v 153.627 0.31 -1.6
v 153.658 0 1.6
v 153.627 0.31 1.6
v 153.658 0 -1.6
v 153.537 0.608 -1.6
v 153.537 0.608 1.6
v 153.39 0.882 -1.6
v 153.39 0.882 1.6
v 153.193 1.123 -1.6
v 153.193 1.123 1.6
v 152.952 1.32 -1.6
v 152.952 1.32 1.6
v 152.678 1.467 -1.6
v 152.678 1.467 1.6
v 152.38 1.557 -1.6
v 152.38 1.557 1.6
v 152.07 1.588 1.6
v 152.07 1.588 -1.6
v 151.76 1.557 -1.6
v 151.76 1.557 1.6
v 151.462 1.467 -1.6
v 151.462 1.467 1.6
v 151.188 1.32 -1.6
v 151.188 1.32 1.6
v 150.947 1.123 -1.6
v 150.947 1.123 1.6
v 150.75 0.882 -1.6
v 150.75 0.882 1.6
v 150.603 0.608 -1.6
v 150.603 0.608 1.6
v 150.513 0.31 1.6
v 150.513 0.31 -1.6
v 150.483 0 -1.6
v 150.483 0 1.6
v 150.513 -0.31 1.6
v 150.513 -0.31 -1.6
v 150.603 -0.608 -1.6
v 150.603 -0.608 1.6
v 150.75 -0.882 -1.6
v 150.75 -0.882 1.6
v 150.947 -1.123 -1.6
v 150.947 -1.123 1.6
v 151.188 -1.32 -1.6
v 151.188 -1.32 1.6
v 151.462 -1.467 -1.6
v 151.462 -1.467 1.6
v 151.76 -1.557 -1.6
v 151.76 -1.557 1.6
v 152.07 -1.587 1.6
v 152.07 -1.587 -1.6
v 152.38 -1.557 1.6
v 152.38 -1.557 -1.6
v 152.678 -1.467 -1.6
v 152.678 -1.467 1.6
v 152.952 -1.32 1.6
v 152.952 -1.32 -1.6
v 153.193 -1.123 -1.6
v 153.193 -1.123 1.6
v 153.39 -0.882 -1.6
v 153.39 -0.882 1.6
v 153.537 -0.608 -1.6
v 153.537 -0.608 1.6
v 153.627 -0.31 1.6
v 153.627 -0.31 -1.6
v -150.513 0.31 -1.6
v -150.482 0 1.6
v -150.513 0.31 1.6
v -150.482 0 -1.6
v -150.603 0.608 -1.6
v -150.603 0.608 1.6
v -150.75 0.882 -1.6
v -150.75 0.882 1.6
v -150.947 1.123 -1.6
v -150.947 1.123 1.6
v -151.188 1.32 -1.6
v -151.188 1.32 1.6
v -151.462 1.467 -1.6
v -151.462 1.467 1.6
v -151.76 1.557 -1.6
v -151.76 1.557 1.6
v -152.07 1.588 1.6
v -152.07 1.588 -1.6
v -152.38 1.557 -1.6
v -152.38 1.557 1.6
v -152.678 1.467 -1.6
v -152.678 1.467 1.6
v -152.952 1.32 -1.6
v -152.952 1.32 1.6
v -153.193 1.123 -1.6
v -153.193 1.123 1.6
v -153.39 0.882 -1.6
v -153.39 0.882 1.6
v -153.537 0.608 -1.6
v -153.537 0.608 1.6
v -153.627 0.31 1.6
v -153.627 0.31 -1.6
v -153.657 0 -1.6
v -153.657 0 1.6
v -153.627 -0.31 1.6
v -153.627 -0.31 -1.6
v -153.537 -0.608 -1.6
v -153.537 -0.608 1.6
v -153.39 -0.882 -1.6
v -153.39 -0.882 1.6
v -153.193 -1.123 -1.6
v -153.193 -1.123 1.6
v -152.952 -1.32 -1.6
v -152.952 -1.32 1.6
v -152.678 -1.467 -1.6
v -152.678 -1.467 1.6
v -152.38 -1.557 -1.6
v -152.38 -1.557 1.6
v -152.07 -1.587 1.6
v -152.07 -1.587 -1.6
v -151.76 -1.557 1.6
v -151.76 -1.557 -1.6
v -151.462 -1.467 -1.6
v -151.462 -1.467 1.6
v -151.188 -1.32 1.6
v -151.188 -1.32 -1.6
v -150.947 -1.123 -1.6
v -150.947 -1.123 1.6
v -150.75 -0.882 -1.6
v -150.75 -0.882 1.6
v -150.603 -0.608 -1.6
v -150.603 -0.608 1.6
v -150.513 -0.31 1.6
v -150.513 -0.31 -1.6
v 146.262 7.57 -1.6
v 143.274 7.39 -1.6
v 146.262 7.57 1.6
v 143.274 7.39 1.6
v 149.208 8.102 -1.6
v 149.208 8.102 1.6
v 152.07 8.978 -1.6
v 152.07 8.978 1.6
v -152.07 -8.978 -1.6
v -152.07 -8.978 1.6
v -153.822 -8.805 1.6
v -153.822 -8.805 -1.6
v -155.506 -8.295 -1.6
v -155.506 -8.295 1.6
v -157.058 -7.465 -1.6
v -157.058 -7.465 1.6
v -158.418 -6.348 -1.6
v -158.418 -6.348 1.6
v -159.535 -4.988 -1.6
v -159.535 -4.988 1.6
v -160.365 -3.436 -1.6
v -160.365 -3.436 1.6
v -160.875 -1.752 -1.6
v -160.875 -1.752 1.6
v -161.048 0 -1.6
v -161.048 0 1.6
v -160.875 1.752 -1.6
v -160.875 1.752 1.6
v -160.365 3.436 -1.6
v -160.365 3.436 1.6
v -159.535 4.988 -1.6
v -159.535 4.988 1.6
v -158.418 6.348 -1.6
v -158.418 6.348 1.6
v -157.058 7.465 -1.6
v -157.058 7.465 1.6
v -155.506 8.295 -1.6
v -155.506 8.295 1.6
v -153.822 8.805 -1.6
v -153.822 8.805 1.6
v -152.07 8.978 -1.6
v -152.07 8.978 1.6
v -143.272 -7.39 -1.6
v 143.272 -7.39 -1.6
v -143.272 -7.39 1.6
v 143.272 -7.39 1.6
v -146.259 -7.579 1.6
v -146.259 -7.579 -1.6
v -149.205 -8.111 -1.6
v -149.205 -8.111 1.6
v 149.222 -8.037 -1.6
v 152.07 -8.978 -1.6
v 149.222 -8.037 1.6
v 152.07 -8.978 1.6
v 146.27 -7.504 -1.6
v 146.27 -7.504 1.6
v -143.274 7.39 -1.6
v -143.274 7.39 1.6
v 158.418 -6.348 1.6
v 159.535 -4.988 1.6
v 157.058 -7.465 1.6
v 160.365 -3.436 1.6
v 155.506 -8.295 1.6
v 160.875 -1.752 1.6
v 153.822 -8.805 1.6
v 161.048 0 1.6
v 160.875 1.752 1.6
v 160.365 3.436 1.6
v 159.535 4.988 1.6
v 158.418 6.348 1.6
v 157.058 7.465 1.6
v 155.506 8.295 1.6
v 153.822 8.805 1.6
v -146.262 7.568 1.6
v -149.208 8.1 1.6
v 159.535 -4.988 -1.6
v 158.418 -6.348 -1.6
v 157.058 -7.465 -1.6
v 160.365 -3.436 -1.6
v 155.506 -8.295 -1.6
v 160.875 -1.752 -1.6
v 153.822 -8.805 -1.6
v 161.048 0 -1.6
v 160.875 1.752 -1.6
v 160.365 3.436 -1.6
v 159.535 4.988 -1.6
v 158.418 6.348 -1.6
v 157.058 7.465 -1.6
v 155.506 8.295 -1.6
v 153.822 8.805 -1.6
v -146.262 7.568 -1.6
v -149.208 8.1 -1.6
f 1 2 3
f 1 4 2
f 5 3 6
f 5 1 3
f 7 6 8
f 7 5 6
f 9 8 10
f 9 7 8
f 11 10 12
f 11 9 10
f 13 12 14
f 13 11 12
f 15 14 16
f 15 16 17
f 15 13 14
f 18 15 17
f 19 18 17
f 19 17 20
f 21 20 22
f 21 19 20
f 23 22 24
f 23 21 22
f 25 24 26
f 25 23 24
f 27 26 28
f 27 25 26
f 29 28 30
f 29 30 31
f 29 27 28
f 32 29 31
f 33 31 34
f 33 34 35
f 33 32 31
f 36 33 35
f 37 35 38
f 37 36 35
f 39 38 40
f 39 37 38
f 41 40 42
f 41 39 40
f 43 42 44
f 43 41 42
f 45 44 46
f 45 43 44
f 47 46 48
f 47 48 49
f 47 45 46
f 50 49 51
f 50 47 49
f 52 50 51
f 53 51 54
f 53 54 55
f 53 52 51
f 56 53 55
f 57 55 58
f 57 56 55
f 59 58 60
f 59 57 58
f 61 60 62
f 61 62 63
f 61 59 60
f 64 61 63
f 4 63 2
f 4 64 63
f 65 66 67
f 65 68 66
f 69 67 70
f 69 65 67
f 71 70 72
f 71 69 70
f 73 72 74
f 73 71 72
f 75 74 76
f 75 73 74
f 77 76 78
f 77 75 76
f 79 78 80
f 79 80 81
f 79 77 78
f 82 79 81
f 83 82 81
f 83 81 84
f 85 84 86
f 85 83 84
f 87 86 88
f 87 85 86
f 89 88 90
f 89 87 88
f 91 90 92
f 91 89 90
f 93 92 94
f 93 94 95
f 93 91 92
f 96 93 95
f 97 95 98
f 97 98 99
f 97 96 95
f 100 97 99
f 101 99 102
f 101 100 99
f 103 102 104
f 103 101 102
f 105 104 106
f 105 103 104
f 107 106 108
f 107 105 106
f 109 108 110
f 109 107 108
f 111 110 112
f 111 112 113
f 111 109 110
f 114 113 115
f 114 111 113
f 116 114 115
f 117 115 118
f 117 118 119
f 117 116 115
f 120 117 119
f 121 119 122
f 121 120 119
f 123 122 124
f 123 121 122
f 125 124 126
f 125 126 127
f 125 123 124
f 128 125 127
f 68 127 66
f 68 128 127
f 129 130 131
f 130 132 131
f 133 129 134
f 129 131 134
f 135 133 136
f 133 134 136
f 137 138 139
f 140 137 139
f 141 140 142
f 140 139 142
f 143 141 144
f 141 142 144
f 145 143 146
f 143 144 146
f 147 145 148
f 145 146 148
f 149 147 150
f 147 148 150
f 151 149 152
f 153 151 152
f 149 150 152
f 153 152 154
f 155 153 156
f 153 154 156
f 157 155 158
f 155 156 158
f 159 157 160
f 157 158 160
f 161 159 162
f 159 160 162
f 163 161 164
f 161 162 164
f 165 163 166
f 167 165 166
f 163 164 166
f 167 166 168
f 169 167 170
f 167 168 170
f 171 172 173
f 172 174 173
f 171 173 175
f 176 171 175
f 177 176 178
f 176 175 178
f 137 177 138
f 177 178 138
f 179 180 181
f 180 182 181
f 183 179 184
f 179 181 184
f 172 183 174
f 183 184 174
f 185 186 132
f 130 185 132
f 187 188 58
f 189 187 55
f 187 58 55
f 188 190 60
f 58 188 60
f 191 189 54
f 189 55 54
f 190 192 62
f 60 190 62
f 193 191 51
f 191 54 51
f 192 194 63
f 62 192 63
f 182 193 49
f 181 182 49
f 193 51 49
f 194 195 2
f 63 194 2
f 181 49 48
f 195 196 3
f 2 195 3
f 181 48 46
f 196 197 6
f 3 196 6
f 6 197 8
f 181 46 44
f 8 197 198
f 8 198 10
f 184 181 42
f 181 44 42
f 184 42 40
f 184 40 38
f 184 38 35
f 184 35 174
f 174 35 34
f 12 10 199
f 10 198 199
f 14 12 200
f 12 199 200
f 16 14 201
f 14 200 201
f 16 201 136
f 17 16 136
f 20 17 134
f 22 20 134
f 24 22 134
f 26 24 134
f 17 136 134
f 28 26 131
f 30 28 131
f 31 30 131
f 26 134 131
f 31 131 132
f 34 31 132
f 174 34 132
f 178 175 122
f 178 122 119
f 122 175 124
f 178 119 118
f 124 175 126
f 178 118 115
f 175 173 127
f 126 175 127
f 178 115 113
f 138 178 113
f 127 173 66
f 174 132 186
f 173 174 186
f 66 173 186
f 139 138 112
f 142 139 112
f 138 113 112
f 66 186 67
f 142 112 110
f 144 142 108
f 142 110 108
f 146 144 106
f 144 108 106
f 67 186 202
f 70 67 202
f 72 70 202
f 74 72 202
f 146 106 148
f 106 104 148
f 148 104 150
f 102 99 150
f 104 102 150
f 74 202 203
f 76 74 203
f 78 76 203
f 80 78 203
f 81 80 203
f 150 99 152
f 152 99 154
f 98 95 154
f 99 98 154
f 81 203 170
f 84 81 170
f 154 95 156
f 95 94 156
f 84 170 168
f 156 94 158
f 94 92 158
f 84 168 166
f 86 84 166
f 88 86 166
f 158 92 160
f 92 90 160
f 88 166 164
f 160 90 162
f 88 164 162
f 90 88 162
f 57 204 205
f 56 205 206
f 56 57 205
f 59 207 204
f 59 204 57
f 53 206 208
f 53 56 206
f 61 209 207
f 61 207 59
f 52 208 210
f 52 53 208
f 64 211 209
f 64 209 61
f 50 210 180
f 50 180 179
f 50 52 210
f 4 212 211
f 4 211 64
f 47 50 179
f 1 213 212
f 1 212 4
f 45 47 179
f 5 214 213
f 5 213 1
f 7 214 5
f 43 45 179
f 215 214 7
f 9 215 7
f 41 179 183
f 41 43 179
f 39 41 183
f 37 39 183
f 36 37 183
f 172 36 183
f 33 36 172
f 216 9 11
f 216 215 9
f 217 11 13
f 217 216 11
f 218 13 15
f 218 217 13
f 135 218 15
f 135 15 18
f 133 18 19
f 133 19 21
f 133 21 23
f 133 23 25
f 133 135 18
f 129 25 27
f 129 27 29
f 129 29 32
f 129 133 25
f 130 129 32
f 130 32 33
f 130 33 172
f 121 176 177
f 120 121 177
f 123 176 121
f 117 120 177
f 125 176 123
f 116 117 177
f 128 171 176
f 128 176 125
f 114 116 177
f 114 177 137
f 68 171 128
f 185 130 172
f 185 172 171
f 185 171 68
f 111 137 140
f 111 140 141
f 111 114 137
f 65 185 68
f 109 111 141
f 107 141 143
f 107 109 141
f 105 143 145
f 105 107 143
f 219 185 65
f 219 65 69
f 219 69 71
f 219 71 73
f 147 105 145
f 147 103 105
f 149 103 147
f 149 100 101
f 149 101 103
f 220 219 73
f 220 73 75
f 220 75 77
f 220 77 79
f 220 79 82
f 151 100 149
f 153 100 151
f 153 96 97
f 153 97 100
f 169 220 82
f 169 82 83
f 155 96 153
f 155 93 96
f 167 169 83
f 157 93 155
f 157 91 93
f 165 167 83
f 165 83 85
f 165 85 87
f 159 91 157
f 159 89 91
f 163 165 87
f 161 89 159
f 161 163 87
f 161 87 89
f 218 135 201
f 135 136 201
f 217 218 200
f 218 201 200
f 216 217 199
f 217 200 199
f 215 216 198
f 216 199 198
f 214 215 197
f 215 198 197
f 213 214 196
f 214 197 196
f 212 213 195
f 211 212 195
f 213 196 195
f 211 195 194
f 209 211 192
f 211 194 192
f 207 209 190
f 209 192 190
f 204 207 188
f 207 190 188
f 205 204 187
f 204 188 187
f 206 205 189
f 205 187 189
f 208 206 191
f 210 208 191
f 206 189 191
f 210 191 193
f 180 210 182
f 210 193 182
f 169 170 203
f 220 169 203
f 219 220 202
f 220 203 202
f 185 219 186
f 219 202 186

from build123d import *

# Parameters (mm, degrees)
SKETCH1_R           = 1.5875
BOSS_EXTRUDE1_DEPTH = 1.6


with BuildPart() as part:
    # Sketch1 → Boss-Extrude1 (new, symmetric)
    with BuildSketch(Plane.XY):
        with BuildLine():
            Line((-143.274111577, 7.39), (143.274111608, 7.39))
            ThreePointArc((143.274111608, 7.39), (147.74272521, 7.792581352), (152.070006331, 8.978))
            ThreePointArc((152.070006331, 8.978), (161.04800313, -3.115e-06), (152.070000015, -8.977999914))
            ThreePointArc((152.070000015, -8.977999914), (147.755008516, -7.718567431), (143.272000016, -7.389999914))
            Line((143.272000016, -7.389999914), (-143.271999985, -7.389999914))
            ThreePointArc((-143.271999985, -7.389999914), (-147.739885513, -7.802353266), (-152.069999985, -8.977999914))
            ThreePointArc((-152.069999985, -8.977999914), (-161.047999985, 8.6e-08), (-152.069999985, 8.978000086))
            ThreePointArc((-152.069999985, 8.978000086), (-147.743155019, 7.790183335), (-143.274111577, 7.39))
        make_face()
        with Locations((-152.069999985, 8.6e-08)):
            Circle(SKETCH1_R, mode=Mode.SUBTRACT)
        with Locations((152.070003173, 4.3e-08)):
            Circle(SKETCH1_R, mode=Mode.SUBTRACT)
    extrude(amount=BOSS_EXTRUDE1_DEPTH, both=True)


solid = part.part
